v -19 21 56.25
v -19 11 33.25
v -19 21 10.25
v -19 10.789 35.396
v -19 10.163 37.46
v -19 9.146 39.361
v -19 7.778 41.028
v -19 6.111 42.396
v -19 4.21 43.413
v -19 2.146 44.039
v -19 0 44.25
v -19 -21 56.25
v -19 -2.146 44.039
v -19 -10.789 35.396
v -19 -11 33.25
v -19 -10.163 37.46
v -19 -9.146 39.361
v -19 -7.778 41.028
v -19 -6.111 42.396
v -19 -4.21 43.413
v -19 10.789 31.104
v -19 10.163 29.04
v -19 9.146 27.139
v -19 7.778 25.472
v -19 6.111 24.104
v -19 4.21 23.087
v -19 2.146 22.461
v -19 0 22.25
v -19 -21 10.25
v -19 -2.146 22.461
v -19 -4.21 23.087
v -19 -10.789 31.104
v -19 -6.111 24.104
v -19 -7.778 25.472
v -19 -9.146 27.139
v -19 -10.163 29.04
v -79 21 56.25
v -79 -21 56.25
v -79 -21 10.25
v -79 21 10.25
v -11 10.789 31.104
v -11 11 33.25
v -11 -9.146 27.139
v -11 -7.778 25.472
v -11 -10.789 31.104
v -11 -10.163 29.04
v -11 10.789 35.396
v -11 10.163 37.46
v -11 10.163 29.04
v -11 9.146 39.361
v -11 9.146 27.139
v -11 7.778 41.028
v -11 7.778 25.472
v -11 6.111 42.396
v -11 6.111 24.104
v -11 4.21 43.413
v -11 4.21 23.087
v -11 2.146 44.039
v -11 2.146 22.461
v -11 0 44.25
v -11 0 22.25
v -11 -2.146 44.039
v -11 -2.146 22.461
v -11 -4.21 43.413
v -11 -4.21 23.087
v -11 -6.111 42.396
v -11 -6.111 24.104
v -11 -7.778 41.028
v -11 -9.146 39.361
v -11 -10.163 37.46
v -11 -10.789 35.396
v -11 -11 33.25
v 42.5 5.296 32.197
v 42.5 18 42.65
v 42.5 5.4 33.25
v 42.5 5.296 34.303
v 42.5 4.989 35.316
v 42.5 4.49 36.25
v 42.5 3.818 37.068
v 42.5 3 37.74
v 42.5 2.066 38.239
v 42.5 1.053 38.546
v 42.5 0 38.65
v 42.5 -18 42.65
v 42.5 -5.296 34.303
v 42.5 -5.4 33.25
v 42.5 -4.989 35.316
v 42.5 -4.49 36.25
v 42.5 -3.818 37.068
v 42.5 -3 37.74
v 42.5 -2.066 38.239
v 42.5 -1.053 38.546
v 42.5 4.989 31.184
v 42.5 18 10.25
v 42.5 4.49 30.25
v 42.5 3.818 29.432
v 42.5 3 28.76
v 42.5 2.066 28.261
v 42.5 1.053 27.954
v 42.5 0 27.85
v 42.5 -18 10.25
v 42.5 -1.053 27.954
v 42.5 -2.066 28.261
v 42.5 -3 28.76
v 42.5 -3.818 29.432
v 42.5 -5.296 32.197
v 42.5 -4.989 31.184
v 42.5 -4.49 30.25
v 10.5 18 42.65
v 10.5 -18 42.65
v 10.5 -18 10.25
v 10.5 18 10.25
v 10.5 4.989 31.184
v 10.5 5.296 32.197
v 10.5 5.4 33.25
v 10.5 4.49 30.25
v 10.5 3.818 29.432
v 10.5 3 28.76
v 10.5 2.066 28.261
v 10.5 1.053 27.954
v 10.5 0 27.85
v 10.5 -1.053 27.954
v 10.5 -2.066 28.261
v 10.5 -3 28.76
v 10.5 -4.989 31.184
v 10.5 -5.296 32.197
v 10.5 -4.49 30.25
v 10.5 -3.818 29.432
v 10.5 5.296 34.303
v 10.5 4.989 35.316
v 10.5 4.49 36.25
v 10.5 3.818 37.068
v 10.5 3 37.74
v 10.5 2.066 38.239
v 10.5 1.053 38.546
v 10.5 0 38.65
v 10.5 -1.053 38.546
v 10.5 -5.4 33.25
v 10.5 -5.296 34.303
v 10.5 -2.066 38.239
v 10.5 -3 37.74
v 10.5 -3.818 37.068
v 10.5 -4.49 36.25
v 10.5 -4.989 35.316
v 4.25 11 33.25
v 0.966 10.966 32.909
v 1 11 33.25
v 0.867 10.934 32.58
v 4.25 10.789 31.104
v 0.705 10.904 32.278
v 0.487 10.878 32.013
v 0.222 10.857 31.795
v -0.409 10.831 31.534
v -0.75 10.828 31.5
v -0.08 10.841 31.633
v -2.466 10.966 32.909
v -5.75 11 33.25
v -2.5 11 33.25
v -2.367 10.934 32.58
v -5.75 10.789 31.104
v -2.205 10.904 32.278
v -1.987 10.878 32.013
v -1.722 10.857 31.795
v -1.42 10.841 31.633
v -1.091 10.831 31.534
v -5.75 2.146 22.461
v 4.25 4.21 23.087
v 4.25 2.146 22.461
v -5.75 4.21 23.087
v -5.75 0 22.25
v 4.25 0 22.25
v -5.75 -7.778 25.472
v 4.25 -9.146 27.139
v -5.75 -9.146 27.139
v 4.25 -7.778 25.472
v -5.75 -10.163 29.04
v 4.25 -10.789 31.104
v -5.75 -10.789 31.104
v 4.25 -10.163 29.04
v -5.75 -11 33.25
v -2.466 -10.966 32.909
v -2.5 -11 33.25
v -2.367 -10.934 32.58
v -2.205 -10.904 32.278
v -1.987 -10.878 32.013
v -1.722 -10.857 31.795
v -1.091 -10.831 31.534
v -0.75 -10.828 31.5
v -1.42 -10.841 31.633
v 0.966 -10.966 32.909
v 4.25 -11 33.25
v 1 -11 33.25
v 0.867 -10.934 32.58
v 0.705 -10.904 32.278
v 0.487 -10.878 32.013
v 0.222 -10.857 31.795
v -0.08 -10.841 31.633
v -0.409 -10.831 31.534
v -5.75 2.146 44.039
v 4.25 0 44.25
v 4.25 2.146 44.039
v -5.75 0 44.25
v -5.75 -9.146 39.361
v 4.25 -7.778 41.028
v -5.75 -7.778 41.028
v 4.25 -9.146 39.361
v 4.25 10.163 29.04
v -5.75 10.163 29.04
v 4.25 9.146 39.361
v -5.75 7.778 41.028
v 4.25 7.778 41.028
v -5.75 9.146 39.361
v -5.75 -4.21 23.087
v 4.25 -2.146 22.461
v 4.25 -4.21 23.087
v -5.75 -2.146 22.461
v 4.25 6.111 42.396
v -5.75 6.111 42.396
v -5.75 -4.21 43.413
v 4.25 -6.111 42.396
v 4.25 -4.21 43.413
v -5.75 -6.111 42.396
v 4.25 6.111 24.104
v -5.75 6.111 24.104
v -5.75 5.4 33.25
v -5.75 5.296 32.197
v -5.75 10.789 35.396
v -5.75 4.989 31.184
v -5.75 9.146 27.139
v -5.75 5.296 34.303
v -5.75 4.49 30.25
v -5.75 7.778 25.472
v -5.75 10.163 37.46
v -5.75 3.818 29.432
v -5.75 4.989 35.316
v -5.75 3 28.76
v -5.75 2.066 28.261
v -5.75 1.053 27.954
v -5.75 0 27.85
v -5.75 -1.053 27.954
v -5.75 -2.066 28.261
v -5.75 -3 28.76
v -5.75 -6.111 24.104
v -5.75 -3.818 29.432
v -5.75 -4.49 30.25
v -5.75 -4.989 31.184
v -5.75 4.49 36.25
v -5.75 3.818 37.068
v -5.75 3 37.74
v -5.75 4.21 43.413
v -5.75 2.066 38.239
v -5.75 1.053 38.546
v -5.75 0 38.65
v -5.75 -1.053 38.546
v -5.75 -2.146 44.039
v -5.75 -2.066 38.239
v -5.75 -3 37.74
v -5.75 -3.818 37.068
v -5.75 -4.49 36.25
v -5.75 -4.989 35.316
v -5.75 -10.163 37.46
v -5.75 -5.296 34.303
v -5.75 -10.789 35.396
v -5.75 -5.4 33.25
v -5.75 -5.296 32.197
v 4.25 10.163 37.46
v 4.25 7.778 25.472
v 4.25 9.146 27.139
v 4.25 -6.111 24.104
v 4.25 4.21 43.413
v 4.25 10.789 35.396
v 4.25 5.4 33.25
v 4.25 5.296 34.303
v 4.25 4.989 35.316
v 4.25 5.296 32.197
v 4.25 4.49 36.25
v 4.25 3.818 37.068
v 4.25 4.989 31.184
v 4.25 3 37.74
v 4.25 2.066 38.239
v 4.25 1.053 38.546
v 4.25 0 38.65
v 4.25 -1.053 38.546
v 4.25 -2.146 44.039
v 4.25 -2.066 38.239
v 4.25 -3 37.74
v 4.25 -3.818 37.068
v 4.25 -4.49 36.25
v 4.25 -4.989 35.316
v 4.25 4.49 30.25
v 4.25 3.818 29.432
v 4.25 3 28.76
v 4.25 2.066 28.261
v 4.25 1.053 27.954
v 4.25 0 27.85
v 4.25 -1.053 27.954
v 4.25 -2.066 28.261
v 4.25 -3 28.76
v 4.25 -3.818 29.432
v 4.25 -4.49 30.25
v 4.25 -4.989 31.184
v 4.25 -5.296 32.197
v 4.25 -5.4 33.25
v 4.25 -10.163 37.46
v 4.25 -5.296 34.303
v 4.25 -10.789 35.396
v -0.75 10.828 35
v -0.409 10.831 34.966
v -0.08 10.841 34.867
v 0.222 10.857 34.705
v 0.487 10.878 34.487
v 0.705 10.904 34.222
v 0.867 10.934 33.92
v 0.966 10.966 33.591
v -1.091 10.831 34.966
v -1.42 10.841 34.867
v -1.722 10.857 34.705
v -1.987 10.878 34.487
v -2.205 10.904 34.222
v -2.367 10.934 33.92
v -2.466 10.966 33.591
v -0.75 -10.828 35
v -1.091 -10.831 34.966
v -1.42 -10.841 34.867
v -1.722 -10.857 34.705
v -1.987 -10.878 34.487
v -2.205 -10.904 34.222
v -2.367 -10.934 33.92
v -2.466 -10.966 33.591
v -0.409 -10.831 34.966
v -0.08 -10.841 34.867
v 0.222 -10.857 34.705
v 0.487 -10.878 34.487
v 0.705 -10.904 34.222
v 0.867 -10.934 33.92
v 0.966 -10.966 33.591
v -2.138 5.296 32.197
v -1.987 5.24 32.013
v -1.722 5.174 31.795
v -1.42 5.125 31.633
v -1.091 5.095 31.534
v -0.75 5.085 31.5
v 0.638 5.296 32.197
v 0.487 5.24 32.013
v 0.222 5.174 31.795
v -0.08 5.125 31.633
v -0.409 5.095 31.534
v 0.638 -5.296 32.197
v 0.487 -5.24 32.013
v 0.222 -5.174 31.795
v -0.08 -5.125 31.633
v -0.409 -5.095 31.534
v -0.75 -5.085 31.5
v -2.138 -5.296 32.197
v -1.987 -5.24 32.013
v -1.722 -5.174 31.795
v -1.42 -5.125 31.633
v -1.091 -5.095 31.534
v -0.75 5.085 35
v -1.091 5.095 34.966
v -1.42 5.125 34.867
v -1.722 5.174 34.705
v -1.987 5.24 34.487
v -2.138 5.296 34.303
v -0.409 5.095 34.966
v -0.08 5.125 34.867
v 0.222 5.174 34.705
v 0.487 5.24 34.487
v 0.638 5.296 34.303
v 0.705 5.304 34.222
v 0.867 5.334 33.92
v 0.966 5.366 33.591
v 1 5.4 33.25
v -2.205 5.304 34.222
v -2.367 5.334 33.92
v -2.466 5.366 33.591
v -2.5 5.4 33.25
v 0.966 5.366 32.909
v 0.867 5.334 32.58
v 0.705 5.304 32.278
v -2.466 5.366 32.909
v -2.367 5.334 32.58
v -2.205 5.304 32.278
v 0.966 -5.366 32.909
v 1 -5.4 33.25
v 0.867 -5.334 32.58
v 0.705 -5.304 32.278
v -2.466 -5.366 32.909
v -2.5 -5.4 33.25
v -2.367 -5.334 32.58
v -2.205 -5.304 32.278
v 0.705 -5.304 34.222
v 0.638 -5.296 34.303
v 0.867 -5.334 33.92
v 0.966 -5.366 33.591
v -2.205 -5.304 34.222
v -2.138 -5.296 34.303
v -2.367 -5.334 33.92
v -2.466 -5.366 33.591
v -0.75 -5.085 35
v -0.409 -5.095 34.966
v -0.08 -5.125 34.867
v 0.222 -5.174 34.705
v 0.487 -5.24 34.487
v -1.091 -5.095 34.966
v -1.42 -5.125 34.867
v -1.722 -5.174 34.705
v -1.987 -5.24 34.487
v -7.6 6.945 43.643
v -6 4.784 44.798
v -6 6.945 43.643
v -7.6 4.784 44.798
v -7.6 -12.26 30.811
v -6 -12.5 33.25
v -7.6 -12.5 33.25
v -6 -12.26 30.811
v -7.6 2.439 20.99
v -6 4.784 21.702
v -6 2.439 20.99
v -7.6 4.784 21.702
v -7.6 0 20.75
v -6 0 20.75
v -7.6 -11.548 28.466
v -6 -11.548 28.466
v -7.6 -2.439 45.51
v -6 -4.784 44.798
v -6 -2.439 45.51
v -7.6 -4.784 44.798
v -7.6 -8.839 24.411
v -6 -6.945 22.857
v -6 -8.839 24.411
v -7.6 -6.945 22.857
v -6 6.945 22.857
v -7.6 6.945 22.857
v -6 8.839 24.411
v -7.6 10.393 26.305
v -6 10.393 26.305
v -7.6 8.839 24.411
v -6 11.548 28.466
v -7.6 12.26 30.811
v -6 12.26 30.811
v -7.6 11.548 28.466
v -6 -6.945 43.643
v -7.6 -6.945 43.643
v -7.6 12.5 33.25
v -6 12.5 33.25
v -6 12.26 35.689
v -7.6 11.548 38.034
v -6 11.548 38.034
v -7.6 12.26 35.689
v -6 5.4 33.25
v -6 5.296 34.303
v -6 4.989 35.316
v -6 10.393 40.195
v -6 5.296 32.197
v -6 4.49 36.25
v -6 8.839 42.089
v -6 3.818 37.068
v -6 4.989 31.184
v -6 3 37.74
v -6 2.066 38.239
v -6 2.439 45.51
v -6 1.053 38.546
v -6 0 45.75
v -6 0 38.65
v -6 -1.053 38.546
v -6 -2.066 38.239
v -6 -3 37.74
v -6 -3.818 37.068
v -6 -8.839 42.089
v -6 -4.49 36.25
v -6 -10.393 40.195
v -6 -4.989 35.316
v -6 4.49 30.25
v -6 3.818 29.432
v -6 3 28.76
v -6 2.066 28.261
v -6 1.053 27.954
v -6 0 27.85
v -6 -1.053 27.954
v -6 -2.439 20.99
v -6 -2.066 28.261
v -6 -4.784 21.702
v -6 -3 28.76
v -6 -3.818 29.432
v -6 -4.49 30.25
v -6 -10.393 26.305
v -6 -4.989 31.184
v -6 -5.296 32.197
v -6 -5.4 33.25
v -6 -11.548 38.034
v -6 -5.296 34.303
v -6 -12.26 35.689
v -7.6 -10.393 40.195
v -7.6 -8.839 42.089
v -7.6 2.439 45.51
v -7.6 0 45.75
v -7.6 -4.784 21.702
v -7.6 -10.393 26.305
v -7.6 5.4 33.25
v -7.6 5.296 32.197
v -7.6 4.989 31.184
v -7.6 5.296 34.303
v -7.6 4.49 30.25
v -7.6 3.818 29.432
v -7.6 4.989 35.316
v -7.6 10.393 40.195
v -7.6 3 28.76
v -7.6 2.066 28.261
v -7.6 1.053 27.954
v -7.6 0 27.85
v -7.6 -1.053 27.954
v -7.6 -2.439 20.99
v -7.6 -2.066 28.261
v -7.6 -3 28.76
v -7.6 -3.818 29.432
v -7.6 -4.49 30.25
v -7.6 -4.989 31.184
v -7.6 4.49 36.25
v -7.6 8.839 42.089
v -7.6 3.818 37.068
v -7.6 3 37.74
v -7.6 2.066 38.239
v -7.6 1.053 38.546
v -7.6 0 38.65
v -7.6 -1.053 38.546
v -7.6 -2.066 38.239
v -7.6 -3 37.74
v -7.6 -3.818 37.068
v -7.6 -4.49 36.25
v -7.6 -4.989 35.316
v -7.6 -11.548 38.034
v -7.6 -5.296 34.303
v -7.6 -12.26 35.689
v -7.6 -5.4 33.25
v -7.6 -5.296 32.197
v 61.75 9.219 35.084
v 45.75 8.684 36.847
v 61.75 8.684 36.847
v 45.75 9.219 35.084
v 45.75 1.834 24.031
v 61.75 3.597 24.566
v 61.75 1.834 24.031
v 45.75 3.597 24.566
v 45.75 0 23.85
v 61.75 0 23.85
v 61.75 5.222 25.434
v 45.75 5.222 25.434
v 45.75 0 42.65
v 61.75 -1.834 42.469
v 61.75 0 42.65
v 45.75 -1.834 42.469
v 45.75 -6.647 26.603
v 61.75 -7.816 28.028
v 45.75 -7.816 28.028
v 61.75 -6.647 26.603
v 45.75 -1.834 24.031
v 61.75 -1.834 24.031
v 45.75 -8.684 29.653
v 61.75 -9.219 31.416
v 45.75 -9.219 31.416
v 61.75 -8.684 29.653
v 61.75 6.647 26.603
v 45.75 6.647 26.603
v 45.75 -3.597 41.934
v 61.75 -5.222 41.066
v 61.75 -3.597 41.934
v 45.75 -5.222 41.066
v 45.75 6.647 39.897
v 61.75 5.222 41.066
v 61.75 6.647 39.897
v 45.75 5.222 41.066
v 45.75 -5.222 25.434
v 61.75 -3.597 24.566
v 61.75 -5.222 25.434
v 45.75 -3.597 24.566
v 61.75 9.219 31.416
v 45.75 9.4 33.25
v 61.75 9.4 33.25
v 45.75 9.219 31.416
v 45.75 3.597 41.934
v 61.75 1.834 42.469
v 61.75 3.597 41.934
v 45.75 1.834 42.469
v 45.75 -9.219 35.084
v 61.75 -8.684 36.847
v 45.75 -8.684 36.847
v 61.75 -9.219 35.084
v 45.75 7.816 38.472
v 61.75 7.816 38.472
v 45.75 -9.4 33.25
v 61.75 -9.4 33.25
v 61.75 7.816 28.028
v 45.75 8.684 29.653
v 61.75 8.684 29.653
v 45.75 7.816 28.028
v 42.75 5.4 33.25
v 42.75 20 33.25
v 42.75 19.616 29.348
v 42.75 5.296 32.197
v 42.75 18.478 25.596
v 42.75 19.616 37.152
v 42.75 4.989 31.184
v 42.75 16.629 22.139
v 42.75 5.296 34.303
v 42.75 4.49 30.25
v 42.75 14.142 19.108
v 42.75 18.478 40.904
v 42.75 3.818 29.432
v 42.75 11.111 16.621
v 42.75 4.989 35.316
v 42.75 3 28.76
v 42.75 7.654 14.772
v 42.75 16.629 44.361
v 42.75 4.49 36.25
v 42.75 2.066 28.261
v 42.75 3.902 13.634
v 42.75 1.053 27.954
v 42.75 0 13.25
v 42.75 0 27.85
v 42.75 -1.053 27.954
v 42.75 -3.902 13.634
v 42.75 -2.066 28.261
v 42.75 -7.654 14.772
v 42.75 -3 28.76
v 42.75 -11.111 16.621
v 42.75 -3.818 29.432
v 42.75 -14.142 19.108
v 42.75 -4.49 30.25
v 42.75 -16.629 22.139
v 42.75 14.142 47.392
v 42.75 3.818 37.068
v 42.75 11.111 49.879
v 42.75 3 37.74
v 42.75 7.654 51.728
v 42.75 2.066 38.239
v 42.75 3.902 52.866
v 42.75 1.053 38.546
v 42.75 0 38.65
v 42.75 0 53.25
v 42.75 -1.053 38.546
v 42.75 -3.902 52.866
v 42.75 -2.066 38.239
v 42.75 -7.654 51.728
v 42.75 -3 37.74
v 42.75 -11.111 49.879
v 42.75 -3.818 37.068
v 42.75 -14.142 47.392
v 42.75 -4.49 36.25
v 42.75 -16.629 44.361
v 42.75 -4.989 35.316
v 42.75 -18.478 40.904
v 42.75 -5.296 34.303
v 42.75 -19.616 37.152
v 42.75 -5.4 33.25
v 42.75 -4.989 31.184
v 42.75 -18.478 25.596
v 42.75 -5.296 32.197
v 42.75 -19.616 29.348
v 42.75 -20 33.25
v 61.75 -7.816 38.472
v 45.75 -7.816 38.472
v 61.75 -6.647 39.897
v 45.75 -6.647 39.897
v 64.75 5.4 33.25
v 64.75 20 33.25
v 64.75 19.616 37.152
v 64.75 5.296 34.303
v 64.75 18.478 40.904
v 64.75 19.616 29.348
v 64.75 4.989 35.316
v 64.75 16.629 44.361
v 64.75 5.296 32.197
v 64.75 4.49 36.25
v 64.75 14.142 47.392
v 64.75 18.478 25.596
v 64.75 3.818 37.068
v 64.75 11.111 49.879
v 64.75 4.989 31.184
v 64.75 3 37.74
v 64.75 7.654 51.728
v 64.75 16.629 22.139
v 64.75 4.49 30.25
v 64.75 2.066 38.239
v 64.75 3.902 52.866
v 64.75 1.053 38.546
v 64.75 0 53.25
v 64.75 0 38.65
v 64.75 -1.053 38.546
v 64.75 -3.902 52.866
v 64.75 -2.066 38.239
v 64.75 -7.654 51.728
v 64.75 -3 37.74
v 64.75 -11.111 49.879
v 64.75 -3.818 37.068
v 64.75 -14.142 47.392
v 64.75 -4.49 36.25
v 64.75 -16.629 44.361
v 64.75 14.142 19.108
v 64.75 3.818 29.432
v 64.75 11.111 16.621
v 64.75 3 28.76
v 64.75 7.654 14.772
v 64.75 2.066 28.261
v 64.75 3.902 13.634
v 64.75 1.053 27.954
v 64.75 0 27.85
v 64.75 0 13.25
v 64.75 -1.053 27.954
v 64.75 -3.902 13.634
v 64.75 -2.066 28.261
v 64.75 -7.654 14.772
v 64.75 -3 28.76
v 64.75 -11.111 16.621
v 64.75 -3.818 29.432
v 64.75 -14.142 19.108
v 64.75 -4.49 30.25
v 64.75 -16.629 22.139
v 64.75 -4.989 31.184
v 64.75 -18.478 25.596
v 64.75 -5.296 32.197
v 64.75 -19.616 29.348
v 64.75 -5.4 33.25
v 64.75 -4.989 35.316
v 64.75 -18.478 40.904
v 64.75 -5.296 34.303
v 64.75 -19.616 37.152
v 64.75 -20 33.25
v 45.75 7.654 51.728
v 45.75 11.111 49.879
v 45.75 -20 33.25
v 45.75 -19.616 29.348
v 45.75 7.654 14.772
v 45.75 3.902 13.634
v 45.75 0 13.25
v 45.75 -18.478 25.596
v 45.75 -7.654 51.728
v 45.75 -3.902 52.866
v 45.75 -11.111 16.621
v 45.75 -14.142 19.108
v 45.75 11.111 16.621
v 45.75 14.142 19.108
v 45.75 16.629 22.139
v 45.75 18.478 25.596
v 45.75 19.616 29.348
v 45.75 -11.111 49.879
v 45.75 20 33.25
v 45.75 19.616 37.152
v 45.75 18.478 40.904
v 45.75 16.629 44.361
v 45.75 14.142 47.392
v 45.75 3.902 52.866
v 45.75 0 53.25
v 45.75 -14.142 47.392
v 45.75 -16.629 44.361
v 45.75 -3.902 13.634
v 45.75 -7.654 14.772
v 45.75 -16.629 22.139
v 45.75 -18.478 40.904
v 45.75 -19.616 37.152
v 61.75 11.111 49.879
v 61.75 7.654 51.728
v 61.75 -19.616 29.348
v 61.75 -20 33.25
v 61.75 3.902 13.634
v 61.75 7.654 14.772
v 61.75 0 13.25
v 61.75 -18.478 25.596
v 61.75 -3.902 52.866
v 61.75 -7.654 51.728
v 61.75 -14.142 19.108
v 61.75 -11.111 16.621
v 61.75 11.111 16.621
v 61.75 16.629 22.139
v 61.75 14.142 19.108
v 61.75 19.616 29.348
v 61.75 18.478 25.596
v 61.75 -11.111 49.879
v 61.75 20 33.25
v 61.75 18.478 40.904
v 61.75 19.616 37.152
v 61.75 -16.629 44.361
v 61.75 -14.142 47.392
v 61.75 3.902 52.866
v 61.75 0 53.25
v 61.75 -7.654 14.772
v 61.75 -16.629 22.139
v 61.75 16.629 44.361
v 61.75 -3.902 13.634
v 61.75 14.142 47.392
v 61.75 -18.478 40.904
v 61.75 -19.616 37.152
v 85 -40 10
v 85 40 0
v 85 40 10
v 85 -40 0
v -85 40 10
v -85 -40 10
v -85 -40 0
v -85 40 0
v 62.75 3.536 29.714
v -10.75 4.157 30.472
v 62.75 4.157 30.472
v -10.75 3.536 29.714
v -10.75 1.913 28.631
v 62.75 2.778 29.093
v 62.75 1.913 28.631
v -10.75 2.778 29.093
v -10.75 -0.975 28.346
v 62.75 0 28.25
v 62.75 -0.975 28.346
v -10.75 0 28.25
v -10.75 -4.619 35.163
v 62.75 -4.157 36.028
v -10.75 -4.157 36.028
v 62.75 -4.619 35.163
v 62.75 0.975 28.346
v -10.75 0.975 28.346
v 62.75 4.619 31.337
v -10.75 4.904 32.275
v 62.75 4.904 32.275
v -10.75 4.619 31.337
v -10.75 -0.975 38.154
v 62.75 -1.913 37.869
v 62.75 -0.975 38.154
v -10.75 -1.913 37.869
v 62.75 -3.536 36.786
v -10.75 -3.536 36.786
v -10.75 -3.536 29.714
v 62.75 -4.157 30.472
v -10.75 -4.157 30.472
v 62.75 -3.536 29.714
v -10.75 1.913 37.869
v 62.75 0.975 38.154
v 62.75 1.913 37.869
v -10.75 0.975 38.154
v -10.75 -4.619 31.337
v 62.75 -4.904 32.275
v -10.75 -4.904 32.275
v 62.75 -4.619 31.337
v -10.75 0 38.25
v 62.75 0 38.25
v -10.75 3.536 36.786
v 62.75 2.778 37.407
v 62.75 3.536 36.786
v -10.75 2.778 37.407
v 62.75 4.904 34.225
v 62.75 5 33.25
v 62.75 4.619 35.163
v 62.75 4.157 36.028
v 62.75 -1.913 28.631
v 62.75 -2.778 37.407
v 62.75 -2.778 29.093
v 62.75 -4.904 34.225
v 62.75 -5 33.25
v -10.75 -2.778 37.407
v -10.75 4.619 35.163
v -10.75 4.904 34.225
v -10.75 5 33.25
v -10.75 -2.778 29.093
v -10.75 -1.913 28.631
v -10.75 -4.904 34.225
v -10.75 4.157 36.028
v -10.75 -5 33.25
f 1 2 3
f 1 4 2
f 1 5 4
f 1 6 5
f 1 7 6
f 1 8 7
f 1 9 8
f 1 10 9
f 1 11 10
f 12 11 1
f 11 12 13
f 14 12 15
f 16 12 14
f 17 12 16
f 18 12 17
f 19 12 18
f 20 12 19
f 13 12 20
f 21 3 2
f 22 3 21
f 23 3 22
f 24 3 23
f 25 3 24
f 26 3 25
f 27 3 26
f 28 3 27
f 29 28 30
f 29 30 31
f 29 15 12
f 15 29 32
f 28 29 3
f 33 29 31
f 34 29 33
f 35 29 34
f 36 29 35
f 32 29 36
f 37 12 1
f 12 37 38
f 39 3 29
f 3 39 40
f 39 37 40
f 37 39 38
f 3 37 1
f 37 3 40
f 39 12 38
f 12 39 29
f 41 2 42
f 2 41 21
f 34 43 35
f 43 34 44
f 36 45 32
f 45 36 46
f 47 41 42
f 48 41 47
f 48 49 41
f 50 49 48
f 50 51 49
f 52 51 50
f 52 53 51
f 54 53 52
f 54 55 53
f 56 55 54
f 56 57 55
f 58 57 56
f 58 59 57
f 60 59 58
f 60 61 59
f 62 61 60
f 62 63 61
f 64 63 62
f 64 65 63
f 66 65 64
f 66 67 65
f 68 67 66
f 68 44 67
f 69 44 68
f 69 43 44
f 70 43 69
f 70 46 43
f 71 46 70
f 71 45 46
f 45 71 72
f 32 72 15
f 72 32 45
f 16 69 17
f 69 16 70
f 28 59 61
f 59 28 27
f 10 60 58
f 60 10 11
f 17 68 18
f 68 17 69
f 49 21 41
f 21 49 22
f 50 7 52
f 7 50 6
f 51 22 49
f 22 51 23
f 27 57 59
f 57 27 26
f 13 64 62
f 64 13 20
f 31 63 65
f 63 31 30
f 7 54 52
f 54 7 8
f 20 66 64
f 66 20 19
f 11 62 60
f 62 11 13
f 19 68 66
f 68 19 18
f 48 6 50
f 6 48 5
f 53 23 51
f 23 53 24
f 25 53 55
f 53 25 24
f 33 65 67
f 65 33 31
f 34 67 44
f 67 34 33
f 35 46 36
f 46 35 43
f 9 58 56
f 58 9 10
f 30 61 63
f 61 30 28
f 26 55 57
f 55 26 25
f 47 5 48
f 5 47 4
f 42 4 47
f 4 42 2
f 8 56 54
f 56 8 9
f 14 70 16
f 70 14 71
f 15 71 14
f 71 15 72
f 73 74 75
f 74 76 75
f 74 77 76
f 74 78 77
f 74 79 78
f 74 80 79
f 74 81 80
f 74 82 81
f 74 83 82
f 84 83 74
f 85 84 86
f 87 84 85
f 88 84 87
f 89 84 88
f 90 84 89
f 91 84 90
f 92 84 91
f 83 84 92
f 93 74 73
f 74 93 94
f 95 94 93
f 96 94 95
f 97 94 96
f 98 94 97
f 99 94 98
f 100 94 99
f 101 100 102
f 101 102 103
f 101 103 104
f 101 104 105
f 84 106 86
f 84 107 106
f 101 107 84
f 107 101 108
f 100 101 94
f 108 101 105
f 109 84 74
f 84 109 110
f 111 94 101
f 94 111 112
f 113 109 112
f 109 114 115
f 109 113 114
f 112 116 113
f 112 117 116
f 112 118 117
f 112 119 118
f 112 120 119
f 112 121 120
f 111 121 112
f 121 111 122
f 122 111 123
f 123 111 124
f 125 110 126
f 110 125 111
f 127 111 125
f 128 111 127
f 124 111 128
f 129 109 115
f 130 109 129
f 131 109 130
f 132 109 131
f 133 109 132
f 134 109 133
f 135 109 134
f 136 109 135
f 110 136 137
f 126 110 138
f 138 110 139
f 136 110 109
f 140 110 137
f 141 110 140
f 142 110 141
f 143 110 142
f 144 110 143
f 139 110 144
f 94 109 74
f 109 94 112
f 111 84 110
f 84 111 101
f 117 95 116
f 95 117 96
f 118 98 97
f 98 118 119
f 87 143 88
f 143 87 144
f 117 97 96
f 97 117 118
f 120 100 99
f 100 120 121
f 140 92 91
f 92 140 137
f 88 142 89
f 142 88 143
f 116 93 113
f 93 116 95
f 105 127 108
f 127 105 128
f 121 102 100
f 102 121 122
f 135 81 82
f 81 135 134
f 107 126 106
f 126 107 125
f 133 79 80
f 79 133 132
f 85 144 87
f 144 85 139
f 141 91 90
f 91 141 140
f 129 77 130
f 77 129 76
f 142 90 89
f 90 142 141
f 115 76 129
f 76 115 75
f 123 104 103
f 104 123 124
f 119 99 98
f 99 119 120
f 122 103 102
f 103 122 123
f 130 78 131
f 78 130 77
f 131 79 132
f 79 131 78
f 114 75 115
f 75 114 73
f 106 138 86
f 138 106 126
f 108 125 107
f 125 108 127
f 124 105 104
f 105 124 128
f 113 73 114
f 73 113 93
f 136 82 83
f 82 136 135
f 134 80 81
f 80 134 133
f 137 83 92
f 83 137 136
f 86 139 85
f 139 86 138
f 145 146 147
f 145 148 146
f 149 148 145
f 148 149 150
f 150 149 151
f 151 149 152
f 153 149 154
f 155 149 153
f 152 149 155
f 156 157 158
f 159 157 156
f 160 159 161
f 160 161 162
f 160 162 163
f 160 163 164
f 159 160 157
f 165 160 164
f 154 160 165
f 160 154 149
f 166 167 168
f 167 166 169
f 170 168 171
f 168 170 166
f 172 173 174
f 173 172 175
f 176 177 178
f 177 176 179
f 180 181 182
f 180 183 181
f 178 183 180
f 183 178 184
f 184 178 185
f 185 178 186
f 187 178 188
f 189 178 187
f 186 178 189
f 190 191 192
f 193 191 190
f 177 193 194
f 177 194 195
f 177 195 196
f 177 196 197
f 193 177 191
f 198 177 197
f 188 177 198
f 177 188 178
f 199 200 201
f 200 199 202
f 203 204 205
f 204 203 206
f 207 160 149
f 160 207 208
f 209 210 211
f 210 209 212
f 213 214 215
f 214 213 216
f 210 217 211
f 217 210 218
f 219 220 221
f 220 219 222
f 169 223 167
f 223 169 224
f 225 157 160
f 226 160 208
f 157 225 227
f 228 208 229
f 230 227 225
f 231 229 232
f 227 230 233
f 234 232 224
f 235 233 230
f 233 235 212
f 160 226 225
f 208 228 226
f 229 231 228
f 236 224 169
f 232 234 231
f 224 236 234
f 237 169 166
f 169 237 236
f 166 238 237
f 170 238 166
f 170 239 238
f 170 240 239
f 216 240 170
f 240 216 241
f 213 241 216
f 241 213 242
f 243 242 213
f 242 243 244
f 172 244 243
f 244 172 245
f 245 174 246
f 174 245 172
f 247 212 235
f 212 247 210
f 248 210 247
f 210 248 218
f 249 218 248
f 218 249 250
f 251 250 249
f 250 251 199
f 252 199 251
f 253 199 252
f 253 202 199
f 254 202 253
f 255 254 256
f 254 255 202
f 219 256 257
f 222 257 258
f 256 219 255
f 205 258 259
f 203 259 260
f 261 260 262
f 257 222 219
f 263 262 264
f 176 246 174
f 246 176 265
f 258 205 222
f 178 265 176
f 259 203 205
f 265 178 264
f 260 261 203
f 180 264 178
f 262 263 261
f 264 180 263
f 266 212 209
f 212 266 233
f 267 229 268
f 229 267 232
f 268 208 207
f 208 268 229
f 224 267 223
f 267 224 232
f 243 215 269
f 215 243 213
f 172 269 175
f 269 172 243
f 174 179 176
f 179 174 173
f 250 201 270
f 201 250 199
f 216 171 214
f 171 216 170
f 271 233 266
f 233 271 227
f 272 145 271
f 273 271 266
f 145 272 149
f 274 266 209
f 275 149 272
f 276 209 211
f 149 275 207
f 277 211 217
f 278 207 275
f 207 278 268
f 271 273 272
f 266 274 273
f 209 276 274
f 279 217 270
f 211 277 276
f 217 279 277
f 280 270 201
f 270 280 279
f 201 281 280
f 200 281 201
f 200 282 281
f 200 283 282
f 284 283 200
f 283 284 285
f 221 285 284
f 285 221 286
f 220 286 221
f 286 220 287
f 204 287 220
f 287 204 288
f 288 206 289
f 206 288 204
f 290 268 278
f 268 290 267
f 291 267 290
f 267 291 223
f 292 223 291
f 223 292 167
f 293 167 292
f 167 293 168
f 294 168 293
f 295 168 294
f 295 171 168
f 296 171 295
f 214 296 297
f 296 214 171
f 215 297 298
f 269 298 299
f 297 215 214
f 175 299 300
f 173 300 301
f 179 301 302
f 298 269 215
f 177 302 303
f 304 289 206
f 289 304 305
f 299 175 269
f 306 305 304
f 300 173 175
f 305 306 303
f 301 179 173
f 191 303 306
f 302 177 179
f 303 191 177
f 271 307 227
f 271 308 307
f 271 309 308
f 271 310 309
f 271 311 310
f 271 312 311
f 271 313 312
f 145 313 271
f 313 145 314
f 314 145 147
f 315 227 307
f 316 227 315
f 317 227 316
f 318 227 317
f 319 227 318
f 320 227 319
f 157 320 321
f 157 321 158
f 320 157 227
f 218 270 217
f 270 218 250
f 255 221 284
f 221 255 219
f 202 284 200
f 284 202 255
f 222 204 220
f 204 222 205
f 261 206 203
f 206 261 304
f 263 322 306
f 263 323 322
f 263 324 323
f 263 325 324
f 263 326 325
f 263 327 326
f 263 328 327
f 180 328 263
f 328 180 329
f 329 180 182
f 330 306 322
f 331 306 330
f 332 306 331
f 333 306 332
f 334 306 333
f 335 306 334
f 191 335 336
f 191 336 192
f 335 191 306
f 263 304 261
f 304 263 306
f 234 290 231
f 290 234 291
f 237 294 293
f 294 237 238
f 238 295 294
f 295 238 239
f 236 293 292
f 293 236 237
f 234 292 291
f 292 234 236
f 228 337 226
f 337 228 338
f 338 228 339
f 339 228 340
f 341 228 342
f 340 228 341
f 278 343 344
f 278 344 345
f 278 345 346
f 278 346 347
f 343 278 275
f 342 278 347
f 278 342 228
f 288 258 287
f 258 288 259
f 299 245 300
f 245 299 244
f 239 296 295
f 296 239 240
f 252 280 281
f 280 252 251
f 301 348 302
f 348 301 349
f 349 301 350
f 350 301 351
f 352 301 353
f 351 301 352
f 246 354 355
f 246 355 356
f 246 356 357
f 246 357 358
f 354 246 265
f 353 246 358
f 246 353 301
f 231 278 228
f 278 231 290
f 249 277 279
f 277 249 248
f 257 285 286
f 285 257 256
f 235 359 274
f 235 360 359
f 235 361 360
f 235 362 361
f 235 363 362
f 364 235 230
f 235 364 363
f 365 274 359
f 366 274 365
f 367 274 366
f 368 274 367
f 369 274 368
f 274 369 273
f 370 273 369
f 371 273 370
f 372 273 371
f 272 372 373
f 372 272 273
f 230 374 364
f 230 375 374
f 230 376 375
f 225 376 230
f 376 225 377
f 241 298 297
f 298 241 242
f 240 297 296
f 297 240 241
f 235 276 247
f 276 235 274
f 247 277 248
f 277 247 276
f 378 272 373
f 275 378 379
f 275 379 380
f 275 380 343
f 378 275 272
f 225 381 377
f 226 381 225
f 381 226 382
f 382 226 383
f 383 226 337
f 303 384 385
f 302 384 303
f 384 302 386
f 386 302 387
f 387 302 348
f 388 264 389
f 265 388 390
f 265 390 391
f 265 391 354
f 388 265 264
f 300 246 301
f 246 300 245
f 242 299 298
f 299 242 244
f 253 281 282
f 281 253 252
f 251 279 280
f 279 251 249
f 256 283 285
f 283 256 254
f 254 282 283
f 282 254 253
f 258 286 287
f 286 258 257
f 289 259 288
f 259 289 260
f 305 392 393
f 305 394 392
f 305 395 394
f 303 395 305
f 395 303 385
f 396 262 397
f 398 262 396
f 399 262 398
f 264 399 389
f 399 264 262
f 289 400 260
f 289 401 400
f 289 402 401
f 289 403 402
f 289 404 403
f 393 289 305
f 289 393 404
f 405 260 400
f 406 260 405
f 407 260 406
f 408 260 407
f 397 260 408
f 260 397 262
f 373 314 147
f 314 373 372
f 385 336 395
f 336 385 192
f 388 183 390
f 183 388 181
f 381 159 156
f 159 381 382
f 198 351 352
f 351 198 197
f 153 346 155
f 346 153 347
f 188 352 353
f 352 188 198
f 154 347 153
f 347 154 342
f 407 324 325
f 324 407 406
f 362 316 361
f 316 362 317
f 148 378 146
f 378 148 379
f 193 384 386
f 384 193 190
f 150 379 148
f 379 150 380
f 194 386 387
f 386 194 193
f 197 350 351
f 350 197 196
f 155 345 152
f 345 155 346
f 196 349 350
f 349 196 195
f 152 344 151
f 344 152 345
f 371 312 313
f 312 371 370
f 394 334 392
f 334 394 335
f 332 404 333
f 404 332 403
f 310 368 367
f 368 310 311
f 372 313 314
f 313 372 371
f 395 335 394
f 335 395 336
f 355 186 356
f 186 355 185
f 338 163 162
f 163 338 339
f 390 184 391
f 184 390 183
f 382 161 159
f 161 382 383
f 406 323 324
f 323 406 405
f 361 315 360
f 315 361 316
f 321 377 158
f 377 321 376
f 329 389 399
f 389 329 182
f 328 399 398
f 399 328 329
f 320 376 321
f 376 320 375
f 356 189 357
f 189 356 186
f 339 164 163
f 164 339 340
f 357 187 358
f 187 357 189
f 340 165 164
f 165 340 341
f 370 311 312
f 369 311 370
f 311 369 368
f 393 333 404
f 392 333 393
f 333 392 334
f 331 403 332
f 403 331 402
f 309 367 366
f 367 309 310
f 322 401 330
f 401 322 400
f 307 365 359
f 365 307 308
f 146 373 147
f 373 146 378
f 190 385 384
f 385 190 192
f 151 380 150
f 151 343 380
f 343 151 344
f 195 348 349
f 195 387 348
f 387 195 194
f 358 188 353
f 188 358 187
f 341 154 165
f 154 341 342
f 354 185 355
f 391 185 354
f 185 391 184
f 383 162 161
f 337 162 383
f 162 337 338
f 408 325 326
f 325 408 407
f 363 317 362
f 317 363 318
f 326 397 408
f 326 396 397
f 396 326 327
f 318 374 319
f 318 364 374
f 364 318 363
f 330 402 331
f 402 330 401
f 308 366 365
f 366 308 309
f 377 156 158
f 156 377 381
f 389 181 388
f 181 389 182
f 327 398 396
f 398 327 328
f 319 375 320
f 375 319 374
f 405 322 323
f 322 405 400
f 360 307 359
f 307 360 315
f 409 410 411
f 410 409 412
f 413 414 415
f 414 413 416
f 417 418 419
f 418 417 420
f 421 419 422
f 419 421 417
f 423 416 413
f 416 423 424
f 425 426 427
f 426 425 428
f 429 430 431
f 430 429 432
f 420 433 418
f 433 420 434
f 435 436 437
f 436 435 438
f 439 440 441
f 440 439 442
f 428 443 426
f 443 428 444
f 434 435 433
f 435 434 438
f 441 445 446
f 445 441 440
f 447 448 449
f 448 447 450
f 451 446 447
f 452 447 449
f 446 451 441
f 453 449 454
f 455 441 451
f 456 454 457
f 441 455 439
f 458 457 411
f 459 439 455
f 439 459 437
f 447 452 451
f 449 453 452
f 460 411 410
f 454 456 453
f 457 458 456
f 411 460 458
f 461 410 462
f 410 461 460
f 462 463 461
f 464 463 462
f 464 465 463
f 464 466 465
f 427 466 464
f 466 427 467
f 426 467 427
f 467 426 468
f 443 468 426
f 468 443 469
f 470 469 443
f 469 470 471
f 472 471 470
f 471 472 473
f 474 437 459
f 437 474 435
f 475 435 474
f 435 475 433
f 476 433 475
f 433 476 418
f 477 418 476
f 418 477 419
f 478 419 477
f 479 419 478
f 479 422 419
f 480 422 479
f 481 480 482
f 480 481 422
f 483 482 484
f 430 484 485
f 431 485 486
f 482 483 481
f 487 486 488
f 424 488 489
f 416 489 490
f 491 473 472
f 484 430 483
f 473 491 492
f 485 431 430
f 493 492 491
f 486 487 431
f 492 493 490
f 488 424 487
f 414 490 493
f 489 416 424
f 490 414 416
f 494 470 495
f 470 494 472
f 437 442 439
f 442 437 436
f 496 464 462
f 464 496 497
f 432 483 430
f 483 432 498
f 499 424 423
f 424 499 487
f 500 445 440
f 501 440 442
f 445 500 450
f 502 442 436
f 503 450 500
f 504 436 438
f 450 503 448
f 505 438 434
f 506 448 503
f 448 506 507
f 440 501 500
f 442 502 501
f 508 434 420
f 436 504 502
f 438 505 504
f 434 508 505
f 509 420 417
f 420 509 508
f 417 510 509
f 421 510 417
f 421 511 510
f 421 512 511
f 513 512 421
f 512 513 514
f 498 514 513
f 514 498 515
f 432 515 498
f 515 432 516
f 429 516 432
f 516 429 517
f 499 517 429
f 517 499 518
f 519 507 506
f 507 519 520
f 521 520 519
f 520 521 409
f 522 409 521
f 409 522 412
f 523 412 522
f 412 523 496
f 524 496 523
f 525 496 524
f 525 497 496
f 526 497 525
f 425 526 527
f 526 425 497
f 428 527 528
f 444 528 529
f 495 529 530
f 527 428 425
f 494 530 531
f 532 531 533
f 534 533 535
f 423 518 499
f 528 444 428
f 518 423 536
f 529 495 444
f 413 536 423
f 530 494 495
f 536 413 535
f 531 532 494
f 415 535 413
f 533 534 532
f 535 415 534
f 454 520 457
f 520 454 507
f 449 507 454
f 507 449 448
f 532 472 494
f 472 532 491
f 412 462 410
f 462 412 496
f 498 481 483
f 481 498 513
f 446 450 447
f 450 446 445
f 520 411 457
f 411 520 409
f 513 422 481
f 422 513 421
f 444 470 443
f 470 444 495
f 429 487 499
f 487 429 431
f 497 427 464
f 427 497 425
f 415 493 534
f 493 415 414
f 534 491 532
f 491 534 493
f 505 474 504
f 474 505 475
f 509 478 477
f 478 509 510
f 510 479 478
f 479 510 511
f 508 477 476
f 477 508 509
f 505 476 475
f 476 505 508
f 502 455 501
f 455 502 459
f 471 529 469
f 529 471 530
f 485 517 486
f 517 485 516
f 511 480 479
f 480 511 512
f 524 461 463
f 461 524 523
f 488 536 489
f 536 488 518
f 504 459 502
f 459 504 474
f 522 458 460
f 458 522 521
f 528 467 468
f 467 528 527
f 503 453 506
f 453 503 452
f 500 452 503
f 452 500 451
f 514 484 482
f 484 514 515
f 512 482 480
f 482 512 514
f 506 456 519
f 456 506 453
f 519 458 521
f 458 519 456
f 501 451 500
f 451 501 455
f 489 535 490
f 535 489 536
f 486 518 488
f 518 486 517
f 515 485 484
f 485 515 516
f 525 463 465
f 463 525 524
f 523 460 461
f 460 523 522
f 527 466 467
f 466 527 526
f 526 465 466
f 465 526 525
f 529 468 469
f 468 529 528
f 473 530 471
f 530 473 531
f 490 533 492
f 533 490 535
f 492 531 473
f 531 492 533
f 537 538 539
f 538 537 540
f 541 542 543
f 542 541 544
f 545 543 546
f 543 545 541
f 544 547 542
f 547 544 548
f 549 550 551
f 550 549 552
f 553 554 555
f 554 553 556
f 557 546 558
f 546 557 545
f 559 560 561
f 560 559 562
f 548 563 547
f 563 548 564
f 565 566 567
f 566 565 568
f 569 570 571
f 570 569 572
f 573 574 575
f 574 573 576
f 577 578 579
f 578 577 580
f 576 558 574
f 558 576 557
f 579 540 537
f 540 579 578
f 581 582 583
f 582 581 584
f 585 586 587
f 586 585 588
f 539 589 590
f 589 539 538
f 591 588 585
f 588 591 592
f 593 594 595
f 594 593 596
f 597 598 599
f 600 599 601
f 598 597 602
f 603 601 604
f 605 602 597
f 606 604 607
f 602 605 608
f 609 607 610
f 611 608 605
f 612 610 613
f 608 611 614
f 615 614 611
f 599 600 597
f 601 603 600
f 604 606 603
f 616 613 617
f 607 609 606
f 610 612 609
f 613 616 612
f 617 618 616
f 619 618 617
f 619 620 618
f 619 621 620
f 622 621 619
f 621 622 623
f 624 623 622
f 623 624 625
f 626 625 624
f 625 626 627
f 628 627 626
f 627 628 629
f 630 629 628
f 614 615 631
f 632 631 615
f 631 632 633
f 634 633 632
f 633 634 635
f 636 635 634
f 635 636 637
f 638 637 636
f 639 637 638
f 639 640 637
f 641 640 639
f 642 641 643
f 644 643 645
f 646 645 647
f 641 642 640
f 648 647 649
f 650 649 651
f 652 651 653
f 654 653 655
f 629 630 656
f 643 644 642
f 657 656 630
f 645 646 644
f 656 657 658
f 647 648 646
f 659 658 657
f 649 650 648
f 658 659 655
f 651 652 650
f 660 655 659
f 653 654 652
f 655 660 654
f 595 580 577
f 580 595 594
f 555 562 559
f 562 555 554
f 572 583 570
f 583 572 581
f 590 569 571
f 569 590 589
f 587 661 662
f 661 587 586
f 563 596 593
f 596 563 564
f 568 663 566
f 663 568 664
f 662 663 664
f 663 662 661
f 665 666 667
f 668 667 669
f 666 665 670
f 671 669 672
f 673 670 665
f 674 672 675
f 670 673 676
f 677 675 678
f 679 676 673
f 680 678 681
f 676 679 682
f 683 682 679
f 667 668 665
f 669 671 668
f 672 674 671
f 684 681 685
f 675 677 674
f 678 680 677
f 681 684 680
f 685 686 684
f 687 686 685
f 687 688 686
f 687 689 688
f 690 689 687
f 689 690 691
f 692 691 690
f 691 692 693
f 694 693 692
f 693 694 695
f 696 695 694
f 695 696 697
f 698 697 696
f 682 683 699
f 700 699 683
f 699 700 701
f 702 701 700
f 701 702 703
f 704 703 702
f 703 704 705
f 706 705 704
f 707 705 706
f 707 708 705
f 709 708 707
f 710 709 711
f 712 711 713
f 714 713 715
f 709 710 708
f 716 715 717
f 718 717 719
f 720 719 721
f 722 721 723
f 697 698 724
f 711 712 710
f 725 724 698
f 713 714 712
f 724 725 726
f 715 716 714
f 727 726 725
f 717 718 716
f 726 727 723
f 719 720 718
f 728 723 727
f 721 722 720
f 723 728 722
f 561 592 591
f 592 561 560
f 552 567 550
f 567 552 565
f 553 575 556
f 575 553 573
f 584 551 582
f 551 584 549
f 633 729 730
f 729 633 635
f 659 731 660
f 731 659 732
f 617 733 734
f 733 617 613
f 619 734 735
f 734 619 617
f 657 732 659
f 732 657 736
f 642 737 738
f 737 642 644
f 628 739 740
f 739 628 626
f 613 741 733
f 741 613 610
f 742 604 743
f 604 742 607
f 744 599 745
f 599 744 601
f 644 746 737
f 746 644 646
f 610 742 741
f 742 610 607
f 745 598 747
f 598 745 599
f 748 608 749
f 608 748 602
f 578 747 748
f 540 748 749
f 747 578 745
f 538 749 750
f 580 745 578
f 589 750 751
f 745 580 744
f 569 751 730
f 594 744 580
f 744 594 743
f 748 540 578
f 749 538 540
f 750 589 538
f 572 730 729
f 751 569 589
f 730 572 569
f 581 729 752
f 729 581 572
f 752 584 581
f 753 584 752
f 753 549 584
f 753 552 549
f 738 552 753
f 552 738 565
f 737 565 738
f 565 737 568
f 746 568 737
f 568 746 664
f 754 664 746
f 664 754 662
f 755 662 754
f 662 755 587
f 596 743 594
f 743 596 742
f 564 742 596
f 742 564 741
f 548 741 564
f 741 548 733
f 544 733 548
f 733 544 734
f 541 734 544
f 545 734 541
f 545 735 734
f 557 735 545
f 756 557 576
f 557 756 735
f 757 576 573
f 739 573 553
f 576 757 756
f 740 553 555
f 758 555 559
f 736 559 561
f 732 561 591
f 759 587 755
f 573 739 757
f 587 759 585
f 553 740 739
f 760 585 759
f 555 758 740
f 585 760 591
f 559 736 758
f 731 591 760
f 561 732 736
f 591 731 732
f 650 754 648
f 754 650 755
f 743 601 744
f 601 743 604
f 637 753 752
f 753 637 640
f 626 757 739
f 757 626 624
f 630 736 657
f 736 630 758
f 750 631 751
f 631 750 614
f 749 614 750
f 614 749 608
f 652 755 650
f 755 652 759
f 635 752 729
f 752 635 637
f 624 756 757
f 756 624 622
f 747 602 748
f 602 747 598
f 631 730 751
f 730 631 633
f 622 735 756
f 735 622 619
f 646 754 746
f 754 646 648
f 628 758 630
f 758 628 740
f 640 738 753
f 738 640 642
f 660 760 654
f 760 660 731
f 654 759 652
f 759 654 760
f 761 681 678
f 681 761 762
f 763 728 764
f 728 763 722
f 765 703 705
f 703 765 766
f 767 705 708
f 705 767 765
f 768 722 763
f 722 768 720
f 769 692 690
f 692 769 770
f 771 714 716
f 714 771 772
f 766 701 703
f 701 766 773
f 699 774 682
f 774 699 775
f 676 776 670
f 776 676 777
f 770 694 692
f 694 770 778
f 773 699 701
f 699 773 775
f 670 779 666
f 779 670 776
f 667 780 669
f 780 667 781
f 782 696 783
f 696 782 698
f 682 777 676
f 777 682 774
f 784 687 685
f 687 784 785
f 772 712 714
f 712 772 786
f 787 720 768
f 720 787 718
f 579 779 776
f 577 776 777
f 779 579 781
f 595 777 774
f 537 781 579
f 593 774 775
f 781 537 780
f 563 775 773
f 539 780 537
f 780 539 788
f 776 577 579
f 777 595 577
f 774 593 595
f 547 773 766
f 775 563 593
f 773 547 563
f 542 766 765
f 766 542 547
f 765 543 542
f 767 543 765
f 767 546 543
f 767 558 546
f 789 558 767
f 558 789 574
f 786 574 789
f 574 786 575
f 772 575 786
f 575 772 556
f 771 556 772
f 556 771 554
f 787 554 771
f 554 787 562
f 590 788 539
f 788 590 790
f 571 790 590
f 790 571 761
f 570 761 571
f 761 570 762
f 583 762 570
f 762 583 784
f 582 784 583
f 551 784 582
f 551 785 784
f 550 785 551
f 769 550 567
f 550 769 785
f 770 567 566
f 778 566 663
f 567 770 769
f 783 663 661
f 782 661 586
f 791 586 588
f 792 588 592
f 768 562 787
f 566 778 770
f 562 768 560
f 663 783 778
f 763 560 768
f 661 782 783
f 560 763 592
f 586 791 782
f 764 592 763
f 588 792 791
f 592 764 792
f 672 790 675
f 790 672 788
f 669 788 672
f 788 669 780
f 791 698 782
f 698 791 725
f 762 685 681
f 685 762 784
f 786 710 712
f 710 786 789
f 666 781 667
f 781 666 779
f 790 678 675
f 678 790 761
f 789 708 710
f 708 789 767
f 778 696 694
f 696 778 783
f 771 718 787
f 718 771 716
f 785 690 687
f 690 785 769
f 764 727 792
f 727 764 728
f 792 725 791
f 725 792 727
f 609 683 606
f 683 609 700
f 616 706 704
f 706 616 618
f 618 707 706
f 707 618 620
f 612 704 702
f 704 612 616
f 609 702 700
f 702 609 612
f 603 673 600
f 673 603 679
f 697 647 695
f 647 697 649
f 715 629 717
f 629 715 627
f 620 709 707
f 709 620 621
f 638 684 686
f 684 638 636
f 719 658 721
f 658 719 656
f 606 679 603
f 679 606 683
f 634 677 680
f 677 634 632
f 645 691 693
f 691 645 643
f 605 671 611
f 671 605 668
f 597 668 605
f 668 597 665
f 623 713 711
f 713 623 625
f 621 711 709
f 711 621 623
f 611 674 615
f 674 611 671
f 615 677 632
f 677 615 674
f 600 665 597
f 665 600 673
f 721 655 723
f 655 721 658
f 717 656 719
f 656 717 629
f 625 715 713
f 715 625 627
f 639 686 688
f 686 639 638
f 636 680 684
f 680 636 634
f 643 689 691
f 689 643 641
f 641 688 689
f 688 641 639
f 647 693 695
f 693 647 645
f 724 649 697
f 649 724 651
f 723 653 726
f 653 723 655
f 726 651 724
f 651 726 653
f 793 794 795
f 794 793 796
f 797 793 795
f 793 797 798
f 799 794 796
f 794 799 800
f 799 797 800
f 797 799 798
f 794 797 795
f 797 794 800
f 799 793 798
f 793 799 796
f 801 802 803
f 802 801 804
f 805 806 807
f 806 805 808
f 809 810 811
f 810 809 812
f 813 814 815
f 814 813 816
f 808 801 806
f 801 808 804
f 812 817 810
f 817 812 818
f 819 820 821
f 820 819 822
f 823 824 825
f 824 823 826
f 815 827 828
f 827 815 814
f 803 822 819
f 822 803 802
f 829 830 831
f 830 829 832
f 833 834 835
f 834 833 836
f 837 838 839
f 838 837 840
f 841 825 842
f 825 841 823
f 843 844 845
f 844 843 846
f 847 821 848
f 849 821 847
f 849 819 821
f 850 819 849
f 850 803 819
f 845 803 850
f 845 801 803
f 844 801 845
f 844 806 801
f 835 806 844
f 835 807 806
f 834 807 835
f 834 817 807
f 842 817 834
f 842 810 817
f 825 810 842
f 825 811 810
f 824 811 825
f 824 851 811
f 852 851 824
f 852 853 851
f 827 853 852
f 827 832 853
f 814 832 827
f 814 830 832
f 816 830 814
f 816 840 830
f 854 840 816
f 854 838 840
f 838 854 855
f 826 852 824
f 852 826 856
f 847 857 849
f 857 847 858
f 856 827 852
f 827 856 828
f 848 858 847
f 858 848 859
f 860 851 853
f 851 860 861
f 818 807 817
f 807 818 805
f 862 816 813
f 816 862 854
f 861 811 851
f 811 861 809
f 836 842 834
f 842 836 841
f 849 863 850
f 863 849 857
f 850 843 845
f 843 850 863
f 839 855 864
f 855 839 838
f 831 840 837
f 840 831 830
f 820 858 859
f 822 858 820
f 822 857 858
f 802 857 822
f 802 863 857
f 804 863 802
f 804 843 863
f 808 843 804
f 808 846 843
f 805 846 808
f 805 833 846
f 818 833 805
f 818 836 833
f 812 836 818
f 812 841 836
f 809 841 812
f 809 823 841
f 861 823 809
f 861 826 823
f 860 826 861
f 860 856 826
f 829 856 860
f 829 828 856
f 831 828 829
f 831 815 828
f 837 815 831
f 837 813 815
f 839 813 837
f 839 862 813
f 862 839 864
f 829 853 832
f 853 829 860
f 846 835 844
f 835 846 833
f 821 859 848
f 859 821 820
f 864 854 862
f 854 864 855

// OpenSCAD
$fn = 32;

// ------------------------------------------------------------------------
// Motor drive station: motor 60 x 46 mm, shaft d10, pulley d40
// Every part is its own module, assembly() places every instance.
// ------------------------------------------------------------------------

// --- part 1 ---
module station_bed() {
  difference() {
    translate([-85, -40, 0]) cube([170, 80, 10]);
  }
}

// --- part 2 ---
module drive_motor() {
  union() {
    translate([-30, -21, 0]) cube([60, 42, 46]);
    translate([34, 0, 23]) rotate([0, 90, 0]) cylinder(h = 8, d = 22, center = true);
  }
}

// --- part 3 ---
module pillow_block() {
  difference() {
    translate([-16, -18, 0]) cube([32, 36, 32.4]);
    translate([0, 0, 23]) rotate([0, 90, 0]) cylinder(h = 34, d = 10.8, center = true);
  }
}

// --- part 4 ---
module drive_shaft() {
  translate([0, 0, -36.75]) cylinder(h = 73.5, d = 10);
}

// --- part 5 ---
module shaft_collar() {
  difference() {
    cylinder(h = 10, d = 22);
    translate([0, 0, -1]) cylinder(h = 12, d = 10.8);
    translate([0, 0, 5]) rotate([90, 0, 0]) cylinder(h = 24, d = 3.5, center = true);
  }
}

// --- part 6 ---
module collar_washer() {
  difference() {
      translate([0, 0, 0]) cylinder(h = 1.6, d = 25);
      translate([0, 0, -1]) cylinder(h = 3.6, d = 10.8);
    }
}

// --- part 7 ---
module drive_pulley() {
  difference() {
    union() {
      cylinder(h = 22, d = 18.8);
      cylinder(h = 3, d = 40);
      translate([0, 0, 19]) cylinder(h = 3, d = 40);
    }
    translate([0, 0, -1]) cylinder(h = 24, d = 10.8);
  }
}

// --- assembly ---
module assembly() {
  color([0.80, 0.24, 0.20]) translate([0, 0, 0]) rotate([0, 0, 0]) station_bed();
  color([0.20, 0.45, 0.75]) translate([-49, 0, 10.25]) rotate([0, 0, 0]) drive_motor();
  color([0.25, 0.62, 0.32]) translate([26.5, 0, 10.25]) rotate([0, 0, 0]) pillow_block();
  color([0.92, 0.70, 0.18]) translate([26, 0, 33.25]) rotate([0, 90, 0]) drive_shaft();
  color([0.58, 0.35, 0.70]) translate([-5.75, 0, 33.25]) rotate([0, 90, 0]) shaft_collar();
  color([0.16, 0.66, 0.66]) translate([-7.6, 0, 33.25]) rotate([0, 90, 0]) collar_washer();
  color([0.85, 0.48, 0.18]) translate([42.75, 0, 33.25]) rotate([0, 90, 0]) drive_pulley();
}

assembly();
